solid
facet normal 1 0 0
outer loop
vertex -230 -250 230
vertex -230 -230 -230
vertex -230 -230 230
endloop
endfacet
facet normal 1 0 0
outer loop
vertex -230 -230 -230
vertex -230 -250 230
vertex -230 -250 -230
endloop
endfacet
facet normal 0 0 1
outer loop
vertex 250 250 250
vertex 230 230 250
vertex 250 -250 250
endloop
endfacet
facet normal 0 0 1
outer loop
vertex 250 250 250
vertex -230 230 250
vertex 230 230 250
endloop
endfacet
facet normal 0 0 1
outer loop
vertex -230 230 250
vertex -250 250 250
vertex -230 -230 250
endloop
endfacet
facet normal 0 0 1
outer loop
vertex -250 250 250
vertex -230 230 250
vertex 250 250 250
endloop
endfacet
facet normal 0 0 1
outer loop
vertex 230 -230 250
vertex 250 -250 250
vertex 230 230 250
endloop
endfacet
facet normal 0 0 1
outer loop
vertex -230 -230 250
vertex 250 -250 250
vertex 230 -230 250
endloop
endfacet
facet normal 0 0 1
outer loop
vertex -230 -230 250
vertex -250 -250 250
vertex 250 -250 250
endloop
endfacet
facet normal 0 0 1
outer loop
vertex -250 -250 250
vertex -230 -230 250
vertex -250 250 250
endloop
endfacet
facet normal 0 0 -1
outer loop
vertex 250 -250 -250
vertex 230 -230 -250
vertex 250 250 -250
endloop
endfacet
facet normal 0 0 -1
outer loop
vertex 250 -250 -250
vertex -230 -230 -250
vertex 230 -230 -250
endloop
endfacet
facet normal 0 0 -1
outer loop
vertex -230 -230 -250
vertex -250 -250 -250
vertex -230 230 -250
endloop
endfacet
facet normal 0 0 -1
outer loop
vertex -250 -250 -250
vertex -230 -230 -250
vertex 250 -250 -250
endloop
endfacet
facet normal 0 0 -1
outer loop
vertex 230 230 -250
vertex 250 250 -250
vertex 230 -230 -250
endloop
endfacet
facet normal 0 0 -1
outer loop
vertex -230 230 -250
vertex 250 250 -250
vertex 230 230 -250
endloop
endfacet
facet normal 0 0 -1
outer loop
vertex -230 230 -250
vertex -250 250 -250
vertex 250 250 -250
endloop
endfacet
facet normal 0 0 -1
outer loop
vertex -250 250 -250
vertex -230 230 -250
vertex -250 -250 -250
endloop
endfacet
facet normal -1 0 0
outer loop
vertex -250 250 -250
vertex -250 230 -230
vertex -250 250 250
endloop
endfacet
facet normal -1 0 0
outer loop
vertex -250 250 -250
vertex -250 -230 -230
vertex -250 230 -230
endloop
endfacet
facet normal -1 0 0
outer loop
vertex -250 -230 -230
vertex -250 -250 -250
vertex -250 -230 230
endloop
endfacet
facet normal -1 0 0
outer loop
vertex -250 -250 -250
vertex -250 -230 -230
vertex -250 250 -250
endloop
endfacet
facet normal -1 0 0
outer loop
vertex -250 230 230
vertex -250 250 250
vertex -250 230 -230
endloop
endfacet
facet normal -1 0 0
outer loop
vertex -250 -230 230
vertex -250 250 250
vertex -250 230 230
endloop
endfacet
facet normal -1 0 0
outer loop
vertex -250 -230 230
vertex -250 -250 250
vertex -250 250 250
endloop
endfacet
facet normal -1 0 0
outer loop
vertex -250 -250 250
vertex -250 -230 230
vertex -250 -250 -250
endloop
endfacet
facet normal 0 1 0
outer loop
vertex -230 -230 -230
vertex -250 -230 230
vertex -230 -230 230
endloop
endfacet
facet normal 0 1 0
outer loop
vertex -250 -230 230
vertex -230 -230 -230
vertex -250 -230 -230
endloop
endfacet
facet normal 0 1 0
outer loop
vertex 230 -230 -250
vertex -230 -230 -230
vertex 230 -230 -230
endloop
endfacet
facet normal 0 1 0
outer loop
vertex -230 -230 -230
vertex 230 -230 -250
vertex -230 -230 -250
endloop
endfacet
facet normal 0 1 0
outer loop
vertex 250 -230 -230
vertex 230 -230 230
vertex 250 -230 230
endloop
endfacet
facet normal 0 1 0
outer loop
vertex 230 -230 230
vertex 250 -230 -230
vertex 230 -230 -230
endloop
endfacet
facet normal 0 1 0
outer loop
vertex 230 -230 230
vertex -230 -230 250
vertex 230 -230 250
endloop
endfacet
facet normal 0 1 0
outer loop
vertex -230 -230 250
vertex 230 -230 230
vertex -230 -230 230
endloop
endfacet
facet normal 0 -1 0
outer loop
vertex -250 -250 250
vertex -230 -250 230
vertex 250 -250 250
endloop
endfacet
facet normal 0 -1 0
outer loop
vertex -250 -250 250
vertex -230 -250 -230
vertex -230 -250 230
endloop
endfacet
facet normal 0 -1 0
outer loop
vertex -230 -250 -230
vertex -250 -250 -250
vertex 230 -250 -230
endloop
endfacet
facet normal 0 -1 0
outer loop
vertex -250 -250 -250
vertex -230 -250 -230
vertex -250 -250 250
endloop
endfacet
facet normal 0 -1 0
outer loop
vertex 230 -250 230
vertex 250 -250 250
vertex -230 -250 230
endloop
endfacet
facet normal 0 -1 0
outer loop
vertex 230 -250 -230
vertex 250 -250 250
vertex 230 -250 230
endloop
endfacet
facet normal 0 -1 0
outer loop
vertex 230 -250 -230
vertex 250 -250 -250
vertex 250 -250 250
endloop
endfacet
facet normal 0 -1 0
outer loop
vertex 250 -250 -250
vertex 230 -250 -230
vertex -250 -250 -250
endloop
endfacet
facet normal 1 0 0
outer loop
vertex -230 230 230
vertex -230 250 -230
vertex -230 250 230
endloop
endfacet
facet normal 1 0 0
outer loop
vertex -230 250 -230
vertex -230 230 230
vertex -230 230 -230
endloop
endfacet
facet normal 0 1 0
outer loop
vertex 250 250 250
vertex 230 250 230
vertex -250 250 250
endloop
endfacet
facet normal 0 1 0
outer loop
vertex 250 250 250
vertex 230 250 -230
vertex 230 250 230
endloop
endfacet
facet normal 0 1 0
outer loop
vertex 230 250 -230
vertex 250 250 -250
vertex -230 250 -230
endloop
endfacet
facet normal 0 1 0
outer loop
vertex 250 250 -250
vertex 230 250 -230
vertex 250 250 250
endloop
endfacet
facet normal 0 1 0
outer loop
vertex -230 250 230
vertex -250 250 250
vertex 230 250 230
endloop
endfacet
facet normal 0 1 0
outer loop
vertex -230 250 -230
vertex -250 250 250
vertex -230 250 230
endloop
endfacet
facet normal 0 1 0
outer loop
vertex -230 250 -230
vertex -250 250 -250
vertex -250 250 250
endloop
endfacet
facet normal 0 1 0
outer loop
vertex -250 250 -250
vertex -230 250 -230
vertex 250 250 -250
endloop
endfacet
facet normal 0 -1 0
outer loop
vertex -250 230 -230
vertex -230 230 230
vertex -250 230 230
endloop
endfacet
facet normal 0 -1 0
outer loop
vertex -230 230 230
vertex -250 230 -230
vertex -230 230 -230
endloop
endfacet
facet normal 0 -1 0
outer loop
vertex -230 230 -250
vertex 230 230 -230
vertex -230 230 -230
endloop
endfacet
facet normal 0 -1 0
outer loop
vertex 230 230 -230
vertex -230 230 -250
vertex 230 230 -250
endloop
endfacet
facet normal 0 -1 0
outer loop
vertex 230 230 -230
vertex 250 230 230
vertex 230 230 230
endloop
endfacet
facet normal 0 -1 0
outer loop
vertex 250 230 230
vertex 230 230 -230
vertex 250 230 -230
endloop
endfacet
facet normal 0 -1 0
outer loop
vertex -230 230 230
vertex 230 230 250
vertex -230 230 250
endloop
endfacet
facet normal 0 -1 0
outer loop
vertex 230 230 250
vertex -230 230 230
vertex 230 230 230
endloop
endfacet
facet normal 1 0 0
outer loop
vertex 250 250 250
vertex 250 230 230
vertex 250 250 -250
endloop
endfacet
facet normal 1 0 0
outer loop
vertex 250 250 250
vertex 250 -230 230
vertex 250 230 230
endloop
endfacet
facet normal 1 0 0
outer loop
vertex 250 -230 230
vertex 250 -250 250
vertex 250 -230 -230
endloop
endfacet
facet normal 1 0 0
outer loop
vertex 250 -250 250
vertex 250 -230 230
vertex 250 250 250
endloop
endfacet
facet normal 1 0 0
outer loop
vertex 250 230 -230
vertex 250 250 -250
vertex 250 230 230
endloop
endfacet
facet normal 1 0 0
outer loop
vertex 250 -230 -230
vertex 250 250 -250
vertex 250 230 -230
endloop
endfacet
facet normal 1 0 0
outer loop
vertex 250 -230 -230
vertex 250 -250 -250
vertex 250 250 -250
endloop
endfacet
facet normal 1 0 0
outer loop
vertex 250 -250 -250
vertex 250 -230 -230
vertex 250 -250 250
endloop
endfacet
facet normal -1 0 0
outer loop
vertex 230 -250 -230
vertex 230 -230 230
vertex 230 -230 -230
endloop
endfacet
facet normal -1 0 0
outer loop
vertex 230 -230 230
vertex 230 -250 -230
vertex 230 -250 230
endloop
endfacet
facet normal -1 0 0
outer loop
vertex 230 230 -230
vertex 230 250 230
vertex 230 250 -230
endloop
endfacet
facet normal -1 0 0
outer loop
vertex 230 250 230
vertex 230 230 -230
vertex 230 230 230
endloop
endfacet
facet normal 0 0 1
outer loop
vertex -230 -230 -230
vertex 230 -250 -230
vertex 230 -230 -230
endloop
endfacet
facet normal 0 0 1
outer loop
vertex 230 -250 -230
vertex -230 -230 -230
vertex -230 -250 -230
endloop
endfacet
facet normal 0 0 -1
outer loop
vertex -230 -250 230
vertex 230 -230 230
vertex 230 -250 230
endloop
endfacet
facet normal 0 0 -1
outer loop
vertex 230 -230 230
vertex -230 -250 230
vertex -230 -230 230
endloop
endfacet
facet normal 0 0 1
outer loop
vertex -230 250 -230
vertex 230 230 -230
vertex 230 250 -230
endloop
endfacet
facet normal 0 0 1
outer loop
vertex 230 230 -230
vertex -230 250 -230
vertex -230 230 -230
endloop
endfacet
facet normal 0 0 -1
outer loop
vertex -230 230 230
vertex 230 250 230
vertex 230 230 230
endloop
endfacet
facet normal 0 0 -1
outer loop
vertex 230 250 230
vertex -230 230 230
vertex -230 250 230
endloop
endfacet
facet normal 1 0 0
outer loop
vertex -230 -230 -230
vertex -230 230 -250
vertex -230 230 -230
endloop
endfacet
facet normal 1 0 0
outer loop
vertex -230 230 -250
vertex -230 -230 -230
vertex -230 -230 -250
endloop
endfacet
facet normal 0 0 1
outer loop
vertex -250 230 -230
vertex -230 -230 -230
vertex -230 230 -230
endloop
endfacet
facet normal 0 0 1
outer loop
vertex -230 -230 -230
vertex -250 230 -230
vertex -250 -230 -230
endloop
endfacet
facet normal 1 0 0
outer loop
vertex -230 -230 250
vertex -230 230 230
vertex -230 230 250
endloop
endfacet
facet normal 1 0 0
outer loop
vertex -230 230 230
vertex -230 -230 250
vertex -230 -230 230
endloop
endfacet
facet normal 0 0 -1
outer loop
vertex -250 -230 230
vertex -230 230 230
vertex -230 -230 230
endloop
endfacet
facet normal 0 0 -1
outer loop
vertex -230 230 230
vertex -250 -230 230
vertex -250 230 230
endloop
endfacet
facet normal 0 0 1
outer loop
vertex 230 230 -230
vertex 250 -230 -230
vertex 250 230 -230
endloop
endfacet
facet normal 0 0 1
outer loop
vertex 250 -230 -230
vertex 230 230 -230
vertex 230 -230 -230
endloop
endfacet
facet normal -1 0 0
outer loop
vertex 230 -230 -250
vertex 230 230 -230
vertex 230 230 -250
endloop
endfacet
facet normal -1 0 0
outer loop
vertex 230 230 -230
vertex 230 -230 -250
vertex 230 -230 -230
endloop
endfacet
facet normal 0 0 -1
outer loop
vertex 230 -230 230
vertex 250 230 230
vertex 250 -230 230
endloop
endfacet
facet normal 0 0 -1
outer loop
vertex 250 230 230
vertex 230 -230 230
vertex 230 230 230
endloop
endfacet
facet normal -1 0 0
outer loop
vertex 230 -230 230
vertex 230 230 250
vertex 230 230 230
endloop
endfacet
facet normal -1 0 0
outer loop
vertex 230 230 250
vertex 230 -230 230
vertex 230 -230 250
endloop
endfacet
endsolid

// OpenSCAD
// Basic parametric cube frame
/*
  Parametric 2020-extrusion cube frame

  edge_len: overall exterior dimension (mm)
  beam:     extrusion width (typically 20 mm)
  centered: shift frame to origin when true
*/
edge_len = 500;    // exterior size of the cube (mm)
beam = 20;         // t-slot extrusion width
centered = true;   // translate to origin

assert(edge_len > beam,
       "edge_len must be greater than the extrusion beam width");

module extrusion_frame(edge_len, beam)
{
  /* Build 12 edge-beams of the cube */

  // vertical edges
  for (x = [0, edge_len-beam])
  for (y = [0, edge_len-beam])
    translate([x, y, 0])
      cube([beam, beam, edge_len]);

  // edges parallel to X-axis (front & back, bottom & top)
  for (y = [0, edge_len-beam])
  for (z = [0, edge_len-beam])
    translate([0, y, z])
      cube([edge_len, beam, beam]);

  // edges parallel to Y-axis (left & right, bottom & top)
  for (x = [0, edge_len-beam])
  for (z = [0, edge_len-beam])
    translate([x, 0, z])
      cube([beam, edge_len, beam]);
}

// optionally centre the cube at the origin
if (centered)
  translate([-edge_len/2, -edge_len/2, -edge_len/2])
    extrusion_frame(edge_len, beam);
else
  extrusion_frame(edge_len, beam);
